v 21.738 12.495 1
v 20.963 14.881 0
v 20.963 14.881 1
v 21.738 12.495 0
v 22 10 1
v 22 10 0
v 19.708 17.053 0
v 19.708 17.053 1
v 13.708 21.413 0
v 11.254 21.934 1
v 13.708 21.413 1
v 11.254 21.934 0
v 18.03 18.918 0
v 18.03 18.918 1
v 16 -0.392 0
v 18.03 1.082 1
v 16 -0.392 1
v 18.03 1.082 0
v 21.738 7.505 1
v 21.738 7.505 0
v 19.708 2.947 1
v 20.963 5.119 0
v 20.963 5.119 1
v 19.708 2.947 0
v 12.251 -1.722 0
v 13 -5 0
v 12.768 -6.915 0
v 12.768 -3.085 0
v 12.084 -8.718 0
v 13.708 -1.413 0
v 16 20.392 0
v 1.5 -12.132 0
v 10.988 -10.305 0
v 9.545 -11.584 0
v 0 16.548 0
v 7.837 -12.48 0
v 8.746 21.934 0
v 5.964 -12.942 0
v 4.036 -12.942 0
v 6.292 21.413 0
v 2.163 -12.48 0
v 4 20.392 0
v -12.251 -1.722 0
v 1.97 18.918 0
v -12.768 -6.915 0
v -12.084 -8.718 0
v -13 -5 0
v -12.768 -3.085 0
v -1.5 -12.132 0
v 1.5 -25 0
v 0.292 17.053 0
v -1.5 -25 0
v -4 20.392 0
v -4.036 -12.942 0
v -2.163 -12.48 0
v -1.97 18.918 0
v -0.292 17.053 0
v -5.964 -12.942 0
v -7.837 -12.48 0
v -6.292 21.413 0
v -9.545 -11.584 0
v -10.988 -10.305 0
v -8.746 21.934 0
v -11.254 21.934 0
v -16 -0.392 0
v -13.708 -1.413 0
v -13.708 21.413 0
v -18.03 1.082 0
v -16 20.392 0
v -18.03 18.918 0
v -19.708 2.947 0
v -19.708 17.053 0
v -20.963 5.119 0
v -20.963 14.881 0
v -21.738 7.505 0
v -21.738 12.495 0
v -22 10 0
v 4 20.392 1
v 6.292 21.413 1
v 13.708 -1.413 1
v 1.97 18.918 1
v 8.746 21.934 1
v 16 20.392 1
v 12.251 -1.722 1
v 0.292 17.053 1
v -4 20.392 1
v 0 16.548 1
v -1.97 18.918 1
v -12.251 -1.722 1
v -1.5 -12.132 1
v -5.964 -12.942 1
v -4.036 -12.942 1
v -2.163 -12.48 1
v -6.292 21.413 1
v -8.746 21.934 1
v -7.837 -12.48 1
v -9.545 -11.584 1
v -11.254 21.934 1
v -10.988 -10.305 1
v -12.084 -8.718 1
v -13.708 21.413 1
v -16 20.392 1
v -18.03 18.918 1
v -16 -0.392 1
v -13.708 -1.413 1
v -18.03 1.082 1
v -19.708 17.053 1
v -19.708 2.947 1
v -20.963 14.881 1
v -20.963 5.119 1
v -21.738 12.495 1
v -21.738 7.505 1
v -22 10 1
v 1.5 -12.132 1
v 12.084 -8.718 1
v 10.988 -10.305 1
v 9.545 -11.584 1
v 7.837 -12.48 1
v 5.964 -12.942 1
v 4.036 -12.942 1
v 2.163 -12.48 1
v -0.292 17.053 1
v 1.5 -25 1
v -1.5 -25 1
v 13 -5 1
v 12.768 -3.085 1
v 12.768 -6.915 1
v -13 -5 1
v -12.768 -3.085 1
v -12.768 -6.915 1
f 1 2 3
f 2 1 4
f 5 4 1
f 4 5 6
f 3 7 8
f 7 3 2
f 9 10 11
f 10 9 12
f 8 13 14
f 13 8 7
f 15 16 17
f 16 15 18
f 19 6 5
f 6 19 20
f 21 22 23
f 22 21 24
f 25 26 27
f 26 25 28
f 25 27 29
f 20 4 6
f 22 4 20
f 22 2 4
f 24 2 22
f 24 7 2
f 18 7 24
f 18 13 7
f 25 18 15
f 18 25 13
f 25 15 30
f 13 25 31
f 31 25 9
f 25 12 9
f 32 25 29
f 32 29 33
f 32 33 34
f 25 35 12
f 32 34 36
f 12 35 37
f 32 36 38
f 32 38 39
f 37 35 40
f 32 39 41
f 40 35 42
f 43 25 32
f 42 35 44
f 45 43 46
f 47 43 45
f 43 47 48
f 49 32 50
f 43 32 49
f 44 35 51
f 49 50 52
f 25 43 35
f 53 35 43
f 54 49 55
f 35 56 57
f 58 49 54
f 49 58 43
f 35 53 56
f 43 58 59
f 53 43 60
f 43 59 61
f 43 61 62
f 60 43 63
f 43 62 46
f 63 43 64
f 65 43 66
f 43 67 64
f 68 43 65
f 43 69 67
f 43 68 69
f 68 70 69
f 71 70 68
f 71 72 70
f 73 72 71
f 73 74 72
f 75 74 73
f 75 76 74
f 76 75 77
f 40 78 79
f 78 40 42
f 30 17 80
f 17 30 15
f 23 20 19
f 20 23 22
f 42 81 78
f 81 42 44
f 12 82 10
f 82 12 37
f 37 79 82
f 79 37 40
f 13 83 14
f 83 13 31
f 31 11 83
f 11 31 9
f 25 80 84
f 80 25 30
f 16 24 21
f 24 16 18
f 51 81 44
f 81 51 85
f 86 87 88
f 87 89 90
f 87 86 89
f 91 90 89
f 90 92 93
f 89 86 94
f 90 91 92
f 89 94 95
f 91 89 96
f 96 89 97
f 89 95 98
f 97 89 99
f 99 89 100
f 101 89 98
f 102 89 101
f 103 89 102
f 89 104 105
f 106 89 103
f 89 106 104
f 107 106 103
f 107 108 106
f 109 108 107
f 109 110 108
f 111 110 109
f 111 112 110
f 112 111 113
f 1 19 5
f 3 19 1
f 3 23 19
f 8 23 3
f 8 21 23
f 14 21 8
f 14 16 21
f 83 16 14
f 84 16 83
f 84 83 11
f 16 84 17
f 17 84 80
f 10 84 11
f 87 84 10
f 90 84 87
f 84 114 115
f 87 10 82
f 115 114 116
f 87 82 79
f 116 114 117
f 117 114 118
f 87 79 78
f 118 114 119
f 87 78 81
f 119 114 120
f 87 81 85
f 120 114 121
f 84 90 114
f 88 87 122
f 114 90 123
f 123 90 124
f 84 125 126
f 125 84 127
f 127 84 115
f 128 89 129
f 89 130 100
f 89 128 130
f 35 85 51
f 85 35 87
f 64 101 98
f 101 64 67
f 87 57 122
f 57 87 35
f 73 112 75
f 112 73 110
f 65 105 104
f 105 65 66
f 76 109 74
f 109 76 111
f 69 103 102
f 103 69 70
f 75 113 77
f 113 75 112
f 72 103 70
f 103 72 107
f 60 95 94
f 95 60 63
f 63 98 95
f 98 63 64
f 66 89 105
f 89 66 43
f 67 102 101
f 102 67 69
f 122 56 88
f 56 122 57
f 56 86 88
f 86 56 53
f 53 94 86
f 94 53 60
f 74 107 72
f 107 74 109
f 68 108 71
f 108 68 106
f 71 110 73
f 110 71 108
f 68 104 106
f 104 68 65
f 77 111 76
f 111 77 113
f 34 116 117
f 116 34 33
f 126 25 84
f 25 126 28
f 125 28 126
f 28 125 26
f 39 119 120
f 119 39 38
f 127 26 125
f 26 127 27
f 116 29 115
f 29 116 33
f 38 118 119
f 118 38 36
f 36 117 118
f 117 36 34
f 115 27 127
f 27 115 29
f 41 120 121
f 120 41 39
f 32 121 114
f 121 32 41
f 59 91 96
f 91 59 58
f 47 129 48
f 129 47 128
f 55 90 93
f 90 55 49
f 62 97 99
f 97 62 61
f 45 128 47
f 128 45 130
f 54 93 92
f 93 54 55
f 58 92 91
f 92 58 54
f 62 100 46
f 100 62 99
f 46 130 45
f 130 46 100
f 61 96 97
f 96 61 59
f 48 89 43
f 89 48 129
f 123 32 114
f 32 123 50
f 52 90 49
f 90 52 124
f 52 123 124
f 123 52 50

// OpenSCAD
translate([10,10,0])
cylinder(h=1, r=12);
translate([-10,10,0])
cylinder(h=1, r=12);
translate([5,-5,0])
cylinder(h=1,r=8);
translate([-5,-5, 0])
cylinder(h=1,r=8);
translate([-1.5,-25,0])
cube([3,30,1]);
